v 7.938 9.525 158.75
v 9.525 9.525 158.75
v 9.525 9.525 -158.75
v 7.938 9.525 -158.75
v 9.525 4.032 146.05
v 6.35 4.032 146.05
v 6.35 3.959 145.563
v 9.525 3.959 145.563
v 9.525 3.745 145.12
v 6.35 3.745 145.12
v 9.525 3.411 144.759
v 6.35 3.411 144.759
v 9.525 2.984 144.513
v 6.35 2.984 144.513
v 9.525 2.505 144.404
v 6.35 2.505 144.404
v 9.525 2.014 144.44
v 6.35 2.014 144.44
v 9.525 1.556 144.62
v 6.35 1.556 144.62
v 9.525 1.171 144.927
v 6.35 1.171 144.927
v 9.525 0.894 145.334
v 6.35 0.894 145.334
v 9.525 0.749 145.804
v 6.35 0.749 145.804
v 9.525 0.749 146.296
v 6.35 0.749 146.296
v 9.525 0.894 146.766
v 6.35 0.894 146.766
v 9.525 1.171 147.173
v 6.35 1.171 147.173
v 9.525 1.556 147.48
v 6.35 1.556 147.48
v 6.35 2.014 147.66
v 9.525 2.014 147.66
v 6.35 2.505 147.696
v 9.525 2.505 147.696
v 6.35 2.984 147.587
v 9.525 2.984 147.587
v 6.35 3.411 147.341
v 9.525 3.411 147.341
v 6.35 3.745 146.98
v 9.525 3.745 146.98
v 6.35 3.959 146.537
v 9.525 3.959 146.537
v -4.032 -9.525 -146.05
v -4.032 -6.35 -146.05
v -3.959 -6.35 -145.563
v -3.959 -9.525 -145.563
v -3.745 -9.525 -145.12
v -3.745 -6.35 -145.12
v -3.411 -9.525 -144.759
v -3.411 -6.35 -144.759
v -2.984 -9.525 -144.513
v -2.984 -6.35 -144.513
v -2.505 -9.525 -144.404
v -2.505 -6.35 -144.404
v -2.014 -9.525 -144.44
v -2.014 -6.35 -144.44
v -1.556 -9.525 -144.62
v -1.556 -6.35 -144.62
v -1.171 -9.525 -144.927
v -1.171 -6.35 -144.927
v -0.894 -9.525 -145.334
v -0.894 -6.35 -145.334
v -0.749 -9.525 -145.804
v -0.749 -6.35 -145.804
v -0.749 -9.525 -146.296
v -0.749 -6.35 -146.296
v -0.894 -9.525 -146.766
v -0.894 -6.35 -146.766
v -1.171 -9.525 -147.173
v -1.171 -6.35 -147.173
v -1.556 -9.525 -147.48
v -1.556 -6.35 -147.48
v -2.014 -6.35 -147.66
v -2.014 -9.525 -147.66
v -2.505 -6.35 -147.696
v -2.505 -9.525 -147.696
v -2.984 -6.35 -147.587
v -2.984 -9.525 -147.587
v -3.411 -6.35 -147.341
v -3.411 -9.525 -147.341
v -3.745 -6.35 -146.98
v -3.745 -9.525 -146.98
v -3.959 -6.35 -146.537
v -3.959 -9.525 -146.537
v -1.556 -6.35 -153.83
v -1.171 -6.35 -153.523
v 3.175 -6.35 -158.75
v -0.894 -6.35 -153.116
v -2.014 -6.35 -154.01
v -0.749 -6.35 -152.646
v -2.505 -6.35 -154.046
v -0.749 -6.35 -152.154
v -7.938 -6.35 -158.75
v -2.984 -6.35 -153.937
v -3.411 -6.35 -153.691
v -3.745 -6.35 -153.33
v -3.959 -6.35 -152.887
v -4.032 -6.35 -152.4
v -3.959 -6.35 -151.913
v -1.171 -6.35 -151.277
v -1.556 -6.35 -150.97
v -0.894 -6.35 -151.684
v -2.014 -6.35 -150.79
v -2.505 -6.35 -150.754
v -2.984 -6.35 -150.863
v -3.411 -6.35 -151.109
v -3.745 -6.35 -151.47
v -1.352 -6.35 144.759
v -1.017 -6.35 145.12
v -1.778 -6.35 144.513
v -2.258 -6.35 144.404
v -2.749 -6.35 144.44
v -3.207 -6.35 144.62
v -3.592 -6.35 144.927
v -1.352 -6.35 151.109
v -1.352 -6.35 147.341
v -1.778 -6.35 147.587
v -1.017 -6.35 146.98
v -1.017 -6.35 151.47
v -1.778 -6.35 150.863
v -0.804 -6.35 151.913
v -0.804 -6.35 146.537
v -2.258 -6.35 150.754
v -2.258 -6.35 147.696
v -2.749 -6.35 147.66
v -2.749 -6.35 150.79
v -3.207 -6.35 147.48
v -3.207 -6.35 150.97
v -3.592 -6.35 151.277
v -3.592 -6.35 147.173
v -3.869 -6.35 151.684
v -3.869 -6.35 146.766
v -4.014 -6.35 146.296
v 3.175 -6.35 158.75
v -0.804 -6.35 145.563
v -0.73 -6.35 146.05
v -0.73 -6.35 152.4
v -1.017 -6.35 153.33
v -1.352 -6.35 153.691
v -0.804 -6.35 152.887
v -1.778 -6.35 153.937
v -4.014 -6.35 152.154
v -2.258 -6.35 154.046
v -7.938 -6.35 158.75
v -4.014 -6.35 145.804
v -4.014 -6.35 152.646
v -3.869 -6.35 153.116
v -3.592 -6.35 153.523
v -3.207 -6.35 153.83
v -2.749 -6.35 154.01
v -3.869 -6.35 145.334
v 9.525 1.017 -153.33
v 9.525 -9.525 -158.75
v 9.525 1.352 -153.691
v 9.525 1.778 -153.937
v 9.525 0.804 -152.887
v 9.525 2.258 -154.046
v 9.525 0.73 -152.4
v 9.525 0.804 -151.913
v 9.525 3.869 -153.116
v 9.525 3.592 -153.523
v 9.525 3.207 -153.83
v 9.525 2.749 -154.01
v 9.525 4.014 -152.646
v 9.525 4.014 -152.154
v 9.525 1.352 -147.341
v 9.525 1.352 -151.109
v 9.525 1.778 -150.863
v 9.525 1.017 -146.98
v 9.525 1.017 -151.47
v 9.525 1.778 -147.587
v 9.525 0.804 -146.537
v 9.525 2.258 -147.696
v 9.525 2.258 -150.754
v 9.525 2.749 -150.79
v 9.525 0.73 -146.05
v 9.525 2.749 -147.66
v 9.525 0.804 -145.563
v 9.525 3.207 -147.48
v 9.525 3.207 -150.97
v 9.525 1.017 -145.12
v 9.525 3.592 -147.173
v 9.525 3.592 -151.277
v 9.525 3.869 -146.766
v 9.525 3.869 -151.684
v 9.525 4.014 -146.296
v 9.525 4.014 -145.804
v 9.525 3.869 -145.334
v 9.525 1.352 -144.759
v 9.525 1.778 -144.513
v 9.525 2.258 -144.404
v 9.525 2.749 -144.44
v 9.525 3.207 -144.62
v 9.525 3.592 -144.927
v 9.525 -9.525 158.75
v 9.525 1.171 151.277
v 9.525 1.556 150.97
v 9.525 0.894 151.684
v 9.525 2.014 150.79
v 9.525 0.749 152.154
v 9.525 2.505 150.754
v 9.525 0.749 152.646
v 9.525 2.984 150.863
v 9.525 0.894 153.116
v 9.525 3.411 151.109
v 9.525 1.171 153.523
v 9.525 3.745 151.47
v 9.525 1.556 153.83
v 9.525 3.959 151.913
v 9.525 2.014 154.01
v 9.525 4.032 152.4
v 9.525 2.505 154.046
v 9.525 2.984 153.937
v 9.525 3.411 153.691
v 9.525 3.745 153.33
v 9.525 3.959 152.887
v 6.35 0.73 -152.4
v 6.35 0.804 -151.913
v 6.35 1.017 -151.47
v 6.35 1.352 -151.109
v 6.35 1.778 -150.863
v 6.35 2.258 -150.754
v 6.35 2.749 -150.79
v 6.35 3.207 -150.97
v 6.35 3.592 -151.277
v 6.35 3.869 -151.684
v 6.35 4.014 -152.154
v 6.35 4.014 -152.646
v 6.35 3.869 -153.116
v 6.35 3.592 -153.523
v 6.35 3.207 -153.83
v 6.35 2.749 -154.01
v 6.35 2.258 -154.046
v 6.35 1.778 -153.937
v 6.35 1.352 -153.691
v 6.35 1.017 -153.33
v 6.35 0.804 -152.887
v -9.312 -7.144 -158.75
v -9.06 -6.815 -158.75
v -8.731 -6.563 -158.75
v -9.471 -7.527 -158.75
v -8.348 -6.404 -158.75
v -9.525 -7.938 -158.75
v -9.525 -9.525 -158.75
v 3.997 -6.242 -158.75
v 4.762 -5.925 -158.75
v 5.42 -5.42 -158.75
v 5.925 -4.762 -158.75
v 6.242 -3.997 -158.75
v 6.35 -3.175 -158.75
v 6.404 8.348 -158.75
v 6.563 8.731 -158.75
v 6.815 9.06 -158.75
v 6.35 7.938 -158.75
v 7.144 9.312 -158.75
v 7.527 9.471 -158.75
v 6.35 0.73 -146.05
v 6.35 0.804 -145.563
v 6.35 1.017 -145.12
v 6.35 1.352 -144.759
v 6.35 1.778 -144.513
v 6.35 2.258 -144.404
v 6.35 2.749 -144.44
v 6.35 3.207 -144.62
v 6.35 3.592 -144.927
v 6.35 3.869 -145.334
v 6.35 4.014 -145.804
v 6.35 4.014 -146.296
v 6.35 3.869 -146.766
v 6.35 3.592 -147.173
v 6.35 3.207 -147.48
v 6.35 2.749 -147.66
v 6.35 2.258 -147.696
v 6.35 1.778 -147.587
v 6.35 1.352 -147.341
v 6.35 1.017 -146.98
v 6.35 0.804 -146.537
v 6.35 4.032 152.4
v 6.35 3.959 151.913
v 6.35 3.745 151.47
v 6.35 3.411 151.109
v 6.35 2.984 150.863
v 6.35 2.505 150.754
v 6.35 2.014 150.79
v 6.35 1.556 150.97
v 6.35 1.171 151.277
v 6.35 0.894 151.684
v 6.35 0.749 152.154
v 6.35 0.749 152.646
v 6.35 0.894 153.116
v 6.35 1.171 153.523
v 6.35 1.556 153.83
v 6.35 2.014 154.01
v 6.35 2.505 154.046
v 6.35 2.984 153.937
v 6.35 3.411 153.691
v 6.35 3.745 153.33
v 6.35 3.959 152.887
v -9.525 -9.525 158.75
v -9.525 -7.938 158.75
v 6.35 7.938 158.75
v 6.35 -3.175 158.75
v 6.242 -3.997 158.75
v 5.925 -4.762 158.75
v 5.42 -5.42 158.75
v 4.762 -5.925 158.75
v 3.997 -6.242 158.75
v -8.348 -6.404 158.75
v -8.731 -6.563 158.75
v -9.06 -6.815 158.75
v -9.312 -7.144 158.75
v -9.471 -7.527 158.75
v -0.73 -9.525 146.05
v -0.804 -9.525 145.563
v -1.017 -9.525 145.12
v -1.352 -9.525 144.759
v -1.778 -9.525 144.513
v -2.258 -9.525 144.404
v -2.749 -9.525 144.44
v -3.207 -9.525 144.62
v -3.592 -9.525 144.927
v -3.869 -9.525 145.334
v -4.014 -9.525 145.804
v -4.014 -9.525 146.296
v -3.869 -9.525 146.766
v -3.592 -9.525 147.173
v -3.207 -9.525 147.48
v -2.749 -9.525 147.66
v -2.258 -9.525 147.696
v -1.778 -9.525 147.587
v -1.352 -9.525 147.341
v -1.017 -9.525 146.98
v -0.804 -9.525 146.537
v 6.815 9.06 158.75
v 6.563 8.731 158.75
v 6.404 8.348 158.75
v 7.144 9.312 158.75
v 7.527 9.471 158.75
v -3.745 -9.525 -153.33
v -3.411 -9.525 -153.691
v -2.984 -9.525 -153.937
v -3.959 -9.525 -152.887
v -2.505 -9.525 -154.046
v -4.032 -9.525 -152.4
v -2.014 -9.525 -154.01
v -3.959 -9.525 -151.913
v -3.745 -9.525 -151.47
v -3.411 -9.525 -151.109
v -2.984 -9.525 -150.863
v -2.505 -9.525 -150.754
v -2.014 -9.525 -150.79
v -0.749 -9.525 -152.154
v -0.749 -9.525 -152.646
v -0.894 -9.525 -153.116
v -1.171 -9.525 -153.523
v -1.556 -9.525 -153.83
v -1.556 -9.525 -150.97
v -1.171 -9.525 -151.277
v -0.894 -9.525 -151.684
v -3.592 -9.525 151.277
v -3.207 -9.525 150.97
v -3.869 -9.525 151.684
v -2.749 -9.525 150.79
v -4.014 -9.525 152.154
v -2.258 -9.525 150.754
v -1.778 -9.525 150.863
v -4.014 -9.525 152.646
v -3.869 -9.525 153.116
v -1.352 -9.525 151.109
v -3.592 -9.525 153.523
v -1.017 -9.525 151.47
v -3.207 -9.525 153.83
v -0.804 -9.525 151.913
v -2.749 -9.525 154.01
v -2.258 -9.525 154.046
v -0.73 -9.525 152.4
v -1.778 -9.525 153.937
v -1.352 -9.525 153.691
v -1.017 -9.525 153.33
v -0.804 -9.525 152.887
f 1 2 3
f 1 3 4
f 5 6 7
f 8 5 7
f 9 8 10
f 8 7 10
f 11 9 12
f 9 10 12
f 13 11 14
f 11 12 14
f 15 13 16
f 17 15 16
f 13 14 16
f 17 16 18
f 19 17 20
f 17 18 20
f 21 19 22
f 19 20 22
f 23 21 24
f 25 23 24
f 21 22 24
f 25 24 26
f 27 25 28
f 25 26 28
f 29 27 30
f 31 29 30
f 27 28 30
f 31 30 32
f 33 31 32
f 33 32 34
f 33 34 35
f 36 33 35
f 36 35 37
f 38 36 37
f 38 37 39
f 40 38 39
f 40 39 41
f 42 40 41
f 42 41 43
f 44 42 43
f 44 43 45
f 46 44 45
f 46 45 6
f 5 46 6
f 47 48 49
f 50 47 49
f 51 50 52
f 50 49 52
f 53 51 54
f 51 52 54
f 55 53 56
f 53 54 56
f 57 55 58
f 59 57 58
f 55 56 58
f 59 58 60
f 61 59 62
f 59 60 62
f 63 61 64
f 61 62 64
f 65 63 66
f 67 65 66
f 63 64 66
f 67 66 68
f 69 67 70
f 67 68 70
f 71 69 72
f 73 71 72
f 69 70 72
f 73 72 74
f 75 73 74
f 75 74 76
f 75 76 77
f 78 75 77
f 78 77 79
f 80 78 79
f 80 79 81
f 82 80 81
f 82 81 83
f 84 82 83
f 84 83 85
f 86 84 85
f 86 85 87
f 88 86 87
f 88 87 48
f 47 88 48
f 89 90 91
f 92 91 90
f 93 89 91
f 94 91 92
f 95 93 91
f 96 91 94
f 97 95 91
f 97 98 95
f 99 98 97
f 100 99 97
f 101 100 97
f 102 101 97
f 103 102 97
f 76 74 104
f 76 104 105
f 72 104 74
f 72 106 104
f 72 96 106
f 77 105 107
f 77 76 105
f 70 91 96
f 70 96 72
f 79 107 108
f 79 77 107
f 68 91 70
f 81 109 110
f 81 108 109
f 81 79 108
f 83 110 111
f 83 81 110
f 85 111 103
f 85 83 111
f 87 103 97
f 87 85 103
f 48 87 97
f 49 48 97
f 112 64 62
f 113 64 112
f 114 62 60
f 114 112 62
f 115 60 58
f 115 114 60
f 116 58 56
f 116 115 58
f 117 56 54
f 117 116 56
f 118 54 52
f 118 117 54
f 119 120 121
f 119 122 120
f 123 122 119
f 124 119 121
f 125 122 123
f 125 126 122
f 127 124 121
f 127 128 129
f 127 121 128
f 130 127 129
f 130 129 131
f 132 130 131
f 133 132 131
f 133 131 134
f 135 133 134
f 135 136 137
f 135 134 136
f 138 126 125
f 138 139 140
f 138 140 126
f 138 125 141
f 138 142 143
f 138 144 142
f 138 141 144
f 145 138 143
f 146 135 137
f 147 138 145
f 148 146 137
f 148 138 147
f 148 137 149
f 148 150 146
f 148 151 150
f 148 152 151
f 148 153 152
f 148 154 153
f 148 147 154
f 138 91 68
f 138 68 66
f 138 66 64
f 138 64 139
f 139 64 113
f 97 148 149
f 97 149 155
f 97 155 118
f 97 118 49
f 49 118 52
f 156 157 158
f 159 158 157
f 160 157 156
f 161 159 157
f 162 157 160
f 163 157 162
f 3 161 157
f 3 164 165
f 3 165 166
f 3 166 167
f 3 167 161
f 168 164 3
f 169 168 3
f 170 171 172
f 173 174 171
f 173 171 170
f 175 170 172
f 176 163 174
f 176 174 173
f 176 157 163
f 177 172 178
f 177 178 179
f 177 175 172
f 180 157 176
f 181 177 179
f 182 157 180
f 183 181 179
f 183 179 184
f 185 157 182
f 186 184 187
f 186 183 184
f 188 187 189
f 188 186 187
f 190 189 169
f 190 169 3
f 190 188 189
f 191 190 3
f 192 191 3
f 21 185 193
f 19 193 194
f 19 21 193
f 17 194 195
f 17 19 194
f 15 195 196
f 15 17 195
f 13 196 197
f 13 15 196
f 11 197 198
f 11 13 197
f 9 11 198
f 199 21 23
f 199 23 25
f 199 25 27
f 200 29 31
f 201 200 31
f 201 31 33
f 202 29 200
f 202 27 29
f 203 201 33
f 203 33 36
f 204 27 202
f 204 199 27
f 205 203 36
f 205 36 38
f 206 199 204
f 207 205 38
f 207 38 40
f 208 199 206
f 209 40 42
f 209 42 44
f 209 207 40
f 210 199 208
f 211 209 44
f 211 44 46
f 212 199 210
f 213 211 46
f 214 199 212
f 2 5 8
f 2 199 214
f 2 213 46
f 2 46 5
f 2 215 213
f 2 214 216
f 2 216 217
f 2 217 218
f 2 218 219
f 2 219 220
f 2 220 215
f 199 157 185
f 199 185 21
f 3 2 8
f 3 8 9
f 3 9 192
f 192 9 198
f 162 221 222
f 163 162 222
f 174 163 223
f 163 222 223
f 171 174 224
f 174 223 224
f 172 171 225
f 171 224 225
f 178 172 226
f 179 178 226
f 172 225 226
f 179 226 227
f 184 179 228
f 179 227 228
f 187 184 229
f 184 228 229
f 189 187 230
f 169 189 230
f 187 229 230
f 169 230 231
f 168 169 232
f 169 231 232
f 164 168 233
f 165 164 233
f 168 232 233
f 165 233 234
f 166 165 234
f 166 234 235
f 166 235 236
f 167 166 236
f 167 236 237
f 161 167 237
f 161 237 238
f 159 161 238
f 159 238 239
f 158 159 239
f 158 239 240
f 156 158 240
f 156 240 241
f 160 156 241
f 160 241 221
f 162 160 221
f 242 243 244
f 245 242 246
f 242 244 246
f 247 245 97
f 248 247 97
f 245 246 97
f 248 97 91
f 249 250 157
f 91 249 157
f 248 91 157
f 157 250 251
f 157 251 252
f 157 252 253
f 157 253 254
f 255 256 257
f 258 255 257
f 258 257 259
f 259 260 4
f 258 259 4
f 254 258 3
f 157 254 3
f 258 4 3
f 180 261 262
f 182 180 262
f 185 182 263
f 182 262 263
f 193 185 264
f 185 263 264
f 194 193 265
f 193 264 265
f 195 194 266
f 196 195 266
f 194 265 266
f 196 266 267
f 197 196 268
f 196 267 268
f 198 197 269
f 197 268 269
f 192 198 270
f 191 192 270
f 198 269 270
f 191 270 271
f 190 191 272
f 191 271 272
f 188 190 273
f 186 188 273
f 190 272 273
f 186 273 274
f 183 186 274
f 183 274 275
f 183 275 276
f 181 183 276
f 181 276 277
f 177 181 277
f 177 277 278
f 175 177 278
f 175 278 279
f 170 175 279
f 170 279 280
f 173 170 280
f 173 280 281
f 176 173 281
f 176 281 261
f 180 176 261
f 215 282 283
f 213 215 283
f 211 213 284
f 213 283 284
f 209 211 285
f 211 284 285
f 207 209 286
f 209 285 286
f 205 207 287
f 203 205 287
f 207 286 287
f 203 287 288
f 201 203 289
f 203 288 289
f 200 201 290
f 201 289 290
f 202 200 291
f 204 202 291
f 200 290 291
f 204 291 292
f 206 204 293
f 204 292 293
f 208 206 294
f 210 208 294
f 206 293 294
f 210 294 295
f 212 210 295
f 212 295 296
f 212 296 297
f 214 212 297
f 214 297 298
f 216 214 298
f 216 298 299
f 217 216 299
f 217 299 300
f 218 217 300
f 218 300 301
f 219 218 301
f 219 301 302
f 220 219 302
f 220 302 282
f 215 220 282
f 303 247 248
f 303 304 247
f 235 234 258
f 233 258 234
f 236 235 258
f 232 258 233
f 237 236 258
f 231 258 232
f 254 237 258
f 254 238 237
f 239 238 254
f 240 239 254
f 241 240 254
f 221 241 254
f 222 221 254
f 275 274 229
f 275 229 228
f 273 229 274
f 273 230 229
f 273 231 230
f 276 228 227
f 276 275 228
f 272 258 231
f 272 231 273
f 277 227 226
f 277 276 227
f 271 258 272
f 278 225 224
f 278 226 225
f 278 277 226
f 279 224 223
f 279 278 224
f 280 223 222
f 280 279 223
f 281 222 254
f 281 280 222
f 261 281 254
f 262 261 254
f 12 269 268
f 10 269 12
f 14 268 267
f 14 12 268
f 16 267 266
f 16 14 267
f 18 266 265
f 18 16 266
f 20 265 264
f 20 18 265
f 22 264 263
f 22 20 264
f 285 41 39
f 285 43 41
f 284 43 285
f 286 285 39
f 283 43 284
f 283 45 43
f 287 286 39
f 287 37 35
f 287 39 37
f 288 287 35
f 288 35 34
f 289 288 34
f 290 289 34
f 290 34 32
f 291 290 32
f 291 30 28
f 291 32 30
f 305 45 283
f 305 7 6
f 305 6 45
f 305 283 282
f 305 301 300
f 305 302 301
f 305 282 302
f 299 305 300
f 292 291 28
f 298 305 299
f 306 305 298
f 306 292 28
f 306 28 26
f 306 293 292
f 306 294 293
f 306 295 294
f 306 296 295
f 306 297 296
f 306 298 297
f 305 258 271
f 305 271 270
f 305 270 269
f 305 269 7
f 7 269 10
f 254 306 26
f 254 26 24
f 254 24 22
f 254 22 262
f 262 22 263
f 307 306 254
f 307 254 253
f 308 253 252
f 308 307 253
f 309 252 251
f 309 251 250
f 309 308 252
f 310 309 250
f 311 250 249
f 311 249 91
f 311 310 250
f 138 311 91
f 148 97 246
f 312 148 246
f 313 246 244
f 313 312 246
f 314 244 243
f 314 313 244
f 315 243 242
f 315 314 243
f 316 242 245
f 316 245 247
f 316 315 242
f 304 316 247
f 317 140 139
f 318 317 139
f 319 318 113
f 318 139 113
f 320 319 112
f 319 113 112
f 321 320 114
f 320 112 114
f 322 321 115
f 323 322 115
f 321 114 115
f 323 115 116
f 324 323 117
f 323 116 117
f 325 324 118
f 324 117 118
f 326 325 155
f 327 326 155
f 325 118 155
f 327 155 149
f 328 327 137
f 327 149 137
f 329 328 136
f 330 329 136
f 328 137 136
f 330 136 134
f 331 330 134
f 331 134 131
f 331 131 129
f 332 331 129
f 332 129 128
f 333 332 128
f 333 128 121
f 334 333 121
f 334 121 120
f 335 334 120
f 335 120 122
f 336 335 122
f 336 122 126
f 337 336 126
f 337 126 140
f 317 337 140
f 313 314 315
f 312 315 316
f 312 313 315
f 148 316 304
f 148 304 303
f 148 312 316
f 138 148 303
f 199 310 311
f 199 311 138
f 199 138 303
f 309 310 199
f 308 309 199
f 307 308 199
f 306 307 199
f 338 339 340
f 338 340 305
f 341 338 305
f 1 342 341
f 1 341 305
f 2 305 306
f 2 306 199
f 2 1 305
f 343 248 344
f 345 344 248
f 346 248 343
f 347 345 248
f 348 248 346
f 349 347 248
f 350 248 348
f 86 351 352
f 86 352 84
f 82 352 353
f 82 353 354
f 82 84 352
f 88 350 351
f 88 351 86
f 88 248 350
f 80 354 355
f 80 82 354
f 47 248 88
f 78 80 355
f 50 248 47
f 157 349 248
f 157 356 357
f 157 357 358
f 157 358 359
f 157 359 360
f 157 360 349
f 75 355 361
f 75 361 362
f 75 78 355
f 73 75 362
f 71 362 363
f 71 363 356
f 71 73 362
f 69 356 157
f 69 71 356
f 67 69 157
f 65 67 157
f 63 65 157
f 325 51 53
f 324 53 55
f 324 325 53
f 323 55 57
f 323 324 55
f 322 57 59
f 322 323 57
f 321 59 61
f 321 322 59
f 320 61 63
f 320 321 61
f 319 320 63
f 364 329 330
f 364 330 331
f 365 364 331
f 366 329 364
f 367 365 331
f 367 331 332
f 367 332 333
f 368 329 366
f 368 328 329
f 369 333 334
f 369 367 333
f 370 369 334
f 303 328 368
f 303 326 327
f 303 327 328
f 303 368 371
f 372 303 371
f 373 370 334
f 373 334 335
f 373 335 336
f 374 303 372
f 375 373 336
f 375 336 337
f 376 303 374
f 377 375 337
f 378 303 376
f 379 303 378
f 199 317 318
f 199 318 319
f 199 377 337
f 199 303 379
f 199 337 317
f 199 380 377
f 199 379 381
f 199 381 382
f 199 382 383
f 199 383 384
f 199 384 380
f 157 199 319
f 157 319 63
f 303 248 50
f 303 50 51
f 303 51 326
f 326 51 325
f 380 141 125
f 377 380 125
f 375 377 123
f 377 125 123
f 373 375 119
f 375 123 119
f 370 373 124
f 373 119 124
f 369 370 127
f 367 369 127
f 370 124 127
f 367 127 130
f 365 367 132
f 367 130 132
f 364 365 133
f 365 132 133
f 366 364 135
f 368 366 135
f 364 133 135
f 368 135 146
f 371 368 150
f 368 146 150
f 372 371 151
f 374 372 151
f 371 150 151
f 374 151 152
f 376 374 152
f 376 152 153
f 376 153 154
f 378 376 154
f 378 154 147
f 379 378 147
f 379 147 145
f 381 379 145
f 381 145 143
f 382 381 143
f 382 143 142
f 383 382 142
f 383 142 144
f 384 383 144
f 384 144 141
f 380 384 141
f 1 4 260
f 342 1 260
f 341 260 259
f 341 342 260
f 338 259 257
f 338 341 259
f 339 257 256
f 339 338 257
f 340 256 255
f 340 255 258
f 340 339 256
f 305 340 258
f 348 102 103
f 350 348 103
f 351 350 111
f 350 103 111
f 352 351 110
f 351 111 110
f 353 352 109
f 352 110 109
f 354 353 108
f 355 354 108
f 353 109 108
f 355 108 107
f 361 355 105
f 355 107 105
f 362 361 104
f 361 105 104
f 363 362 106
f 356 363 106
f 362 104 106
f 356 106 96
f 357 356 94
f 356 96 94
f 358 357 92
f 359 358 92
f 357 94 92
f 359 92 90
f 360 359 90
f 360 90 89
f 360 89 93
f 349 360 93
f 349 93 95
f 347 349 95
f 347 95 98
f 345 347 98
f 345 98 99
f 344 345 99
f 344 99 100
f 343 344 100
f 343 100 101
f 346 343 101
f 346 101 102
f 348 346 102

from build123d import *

# Parameters (mm, degrees)
BOSS_EXTRUDE1_DEPTH = 158.75
SKETCH3_R           = 1.651
CUT_EXTRUDE1_DEPTH  = 160.825854448
SKETCH4_R           = 1.651
CUT_EXTRUDE2_DEPTH  = 160.825854448


with BuildPart() as part:
    # Sketch2 → Boss-Extrude1 (new, symmetric)
    with BuildSketch(Plane.XY):
        with BuildLine():
            Line((-9.525, -9.525), (9.525, -9.525))
            Line((9.525, -9.525), (9.525, 9.525))
            Line((9.525, 9.525), (7.9375, 9.525))
            ThreePointArc((7.9375, 9.525), (6.814967985, 9.060032015), (6.35, 7.9375))
            Line((6.35, 7.9375), (6.35, -3.175))
            ThreePointArc((6.35, -3.175), (5.42006403, -5.42006403), (3.175, -6.35))
            Line((3.175, -6.35), (-7.9375, -6.35))
            ThreePointArc((-7.9375, -6.35), (-9.060032015, -6.814967985), (-9.525, -7.9375))
            Line((-9.525, -7.9375), (-9.525, -9.525))
        make_face()
    extrude(amount=BOSS_EXTRUDE1_DEPTH, both=True)

    # Sketch3 → Cut-Extrude1 (cut, through all)
    with BuildSketch(Plane(origin=(0, -6.35, 0), x_dir=(1, 0, 0), z_dir=(0, 1, 0))):
        with Locations((-2.38125, 152.4)):
            Circle(SKETCH3_R)
        with Locations((-2.38125, 146.05)):
            Circle(SKETCH3_R)
        with Locations((-2.38125, -146.05)):
            Circle(SKETCH3_R)
        with Locations((-2.38125, -152.4)):
            Circle(SKETCH3_R)
    extrude(amount=-CUT_EXTRUDE1_DEPTH, mode=Mode.SUBTRACT)

    # Sketch4 → Cut-Extrude2 (cut, through all)
    with BuildSketch(Plane.ZY.offset(-6.35)):
        with Locations((-152.4, 2.38125)):
            Circle(SKETCH4_R)
        with Locations((-146.05, 2.38125)):
            Circle(SKETCH4_R)
        with Locations((146.05, 2.38125)):
            Circle(SKETCH4_R)
        with Locations((152.4, 2.38125)):
            Circle(SKETCH4_R)
    extrude(amount=-CUT_EXTRUDE2_DEPTH, mode=Mode.SUBTRACT)


solid = part.part
